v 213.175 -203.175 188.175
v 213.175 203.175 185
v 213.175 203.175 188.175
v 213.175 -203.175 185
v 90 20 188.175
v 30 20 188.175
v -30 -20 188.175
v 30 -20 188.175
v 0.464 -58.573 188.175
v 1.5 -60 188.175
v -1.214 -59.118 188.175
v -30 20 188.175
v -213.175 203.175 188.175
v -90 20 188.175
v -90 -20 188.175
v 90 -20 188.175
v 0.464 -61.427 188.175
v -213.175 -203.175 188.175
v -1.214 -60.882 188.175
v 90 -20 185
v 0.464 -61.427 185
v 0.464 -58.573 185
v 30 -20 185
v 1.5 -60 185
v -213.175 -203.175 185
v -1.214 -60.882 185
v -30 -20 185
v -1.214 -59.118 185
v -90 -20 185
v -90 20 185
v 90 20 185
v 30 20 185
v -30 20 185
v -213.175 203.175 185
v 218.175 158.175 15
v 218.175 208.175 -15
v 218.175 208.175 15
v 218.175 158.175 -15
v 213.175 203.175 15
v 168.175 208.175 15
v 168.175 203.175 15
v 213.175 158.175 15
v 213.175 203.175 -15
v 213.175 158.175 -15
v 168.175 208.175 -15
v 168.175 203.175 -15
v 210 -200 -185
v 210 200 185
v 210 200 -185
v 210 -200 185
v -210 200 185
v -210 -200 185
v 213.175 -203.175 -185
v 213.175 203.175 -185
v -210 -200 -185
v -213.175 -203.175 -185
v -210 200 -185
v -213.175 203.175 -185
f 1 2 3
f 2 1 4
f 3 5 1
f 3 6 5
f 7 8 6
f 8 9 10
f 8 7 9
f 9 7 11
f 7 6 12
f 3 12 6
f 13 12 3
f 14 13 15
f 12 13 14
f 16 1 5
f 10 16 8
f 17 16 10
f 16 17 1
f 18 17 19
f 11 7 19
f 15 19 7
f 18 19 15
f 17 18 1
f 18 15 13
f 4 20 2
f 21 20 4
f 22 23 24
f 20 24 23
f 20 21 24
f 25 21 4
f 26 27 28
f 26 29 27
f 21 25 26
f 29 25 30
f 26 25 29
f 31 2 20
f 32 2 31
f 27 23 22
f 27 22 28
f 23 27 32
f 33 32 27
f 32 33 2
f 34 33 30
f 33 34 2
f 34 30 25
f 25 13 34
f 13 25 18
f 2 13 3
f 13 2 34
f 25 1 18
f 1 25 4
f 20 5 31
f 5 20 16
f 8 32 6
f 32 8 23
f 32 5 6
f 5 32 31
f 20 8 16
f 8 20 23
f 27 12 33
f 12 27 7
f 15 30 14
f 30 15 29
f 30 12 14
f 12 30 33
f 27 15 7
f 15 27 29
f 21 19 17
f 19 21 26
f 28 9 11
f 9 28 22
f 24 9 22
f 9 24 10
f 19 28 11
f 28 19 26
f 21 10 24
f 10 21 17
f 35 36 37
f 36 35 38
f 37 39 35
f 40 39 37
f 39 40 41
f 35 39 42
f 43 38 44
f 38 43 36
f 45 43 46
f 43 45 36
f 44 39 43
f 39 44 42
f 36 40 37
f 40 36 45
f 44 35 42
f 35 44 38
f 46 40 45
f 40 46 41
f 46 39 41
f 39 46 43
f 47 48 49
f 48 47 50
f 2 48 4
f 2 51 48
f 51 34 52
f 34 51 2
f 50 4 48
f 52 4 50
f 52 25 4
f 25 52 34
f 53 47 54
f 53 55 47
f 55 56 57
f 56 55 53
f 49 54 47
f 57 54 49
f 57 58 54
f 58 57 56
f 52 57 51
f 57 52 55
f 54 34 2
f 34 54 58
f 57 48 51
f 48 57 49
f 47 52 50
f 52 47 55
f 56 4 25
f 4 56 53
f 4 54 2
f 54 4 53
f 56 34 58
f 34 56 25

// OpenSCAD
//Enclosure for Prusa Mendel i3
//Plate frame

//RAMPS board, arduino, and power supply should not be inside enclosure

////
// Variables
////
width = 420;
height = 370;
depth = 400;

//1/8" plexiglass
thickness = 3.175; 

//extra thickness to avoid screendoor effect 
boolean_extra=1.0;

bottom_corner_height=30;
bottom_corner_length=50;
bottom_corner_thickness=5;
bottom_corner_color=([0.1, 0.1, 0.1]);

////
//front wall
color([0.8, 0.2, 0.2])
translate([0, depth/2+thickness/2, 0])
cube([width, thickness, height], center=true);

//back wall
color([0.2, 0.8, 0.8])
translate([0, -depth/2-thickness/2, 0])
cube([width, thickness, height], center=true);

//left wall
color([0.8, 0.8, 0.2])
translate([width/2+thickness/2, 0, 0])
cube([thickness, depth+thickness*2, height], center=true);

//right wall
color([0.2, 0.2, 0.8])
translate([-width/2-thickness/2, 0, 0])
cube([thickness, depth+thickness*2, height], center=true);

//bottom
//color([0.8, 0.2, 0.8])
//translate([0, 0, -height/2-thickness/2])
//cube([width+thickness*2, depth+thickness*2, thickness], center=true);

//top
color([0.2, 0.8, 0.2])
translate([0, 0, height/2+thickness/2])
difference()
{
  cube([width+thickness*2, depth+thickness*2, thickness], center=true);
  //slots for top of frame spool holder
  translate([60, 0, 0])
  cube([60, 40, thickness+boolean_extra], center=true);
  translate([-60, 0, 0])
  cube([60, 40, thickness+boolean_extra], center=true);
	
  //filament inlet
  translate([0, -60, 0])
  cylinder(h=thickness+boolean_extra, r=3/2, center=true);
}

//4 top corners

//4 middle corners
color(bottom_corner_color)
translate([width/2-bottom_corner_length/2+bottom_corner_thickness+thickness, depth/2-bottom_corner_length/2+bottom_corner_thickness+thickness, 0])
union()
{
  translate([bottom_corner_length/2-bottom_corner_thickness/2, 0, 0])
  cube([bottom_corner_thickness, bottom_corner_length, bottom_corner_height], center=true);
  translate([0, bottom_corner_length/2-bottom_corner_thickness/2, 0])
  cube([bottom_corner_length, bottom_corner_thickness, bottom_corner_height], center=true);
}
